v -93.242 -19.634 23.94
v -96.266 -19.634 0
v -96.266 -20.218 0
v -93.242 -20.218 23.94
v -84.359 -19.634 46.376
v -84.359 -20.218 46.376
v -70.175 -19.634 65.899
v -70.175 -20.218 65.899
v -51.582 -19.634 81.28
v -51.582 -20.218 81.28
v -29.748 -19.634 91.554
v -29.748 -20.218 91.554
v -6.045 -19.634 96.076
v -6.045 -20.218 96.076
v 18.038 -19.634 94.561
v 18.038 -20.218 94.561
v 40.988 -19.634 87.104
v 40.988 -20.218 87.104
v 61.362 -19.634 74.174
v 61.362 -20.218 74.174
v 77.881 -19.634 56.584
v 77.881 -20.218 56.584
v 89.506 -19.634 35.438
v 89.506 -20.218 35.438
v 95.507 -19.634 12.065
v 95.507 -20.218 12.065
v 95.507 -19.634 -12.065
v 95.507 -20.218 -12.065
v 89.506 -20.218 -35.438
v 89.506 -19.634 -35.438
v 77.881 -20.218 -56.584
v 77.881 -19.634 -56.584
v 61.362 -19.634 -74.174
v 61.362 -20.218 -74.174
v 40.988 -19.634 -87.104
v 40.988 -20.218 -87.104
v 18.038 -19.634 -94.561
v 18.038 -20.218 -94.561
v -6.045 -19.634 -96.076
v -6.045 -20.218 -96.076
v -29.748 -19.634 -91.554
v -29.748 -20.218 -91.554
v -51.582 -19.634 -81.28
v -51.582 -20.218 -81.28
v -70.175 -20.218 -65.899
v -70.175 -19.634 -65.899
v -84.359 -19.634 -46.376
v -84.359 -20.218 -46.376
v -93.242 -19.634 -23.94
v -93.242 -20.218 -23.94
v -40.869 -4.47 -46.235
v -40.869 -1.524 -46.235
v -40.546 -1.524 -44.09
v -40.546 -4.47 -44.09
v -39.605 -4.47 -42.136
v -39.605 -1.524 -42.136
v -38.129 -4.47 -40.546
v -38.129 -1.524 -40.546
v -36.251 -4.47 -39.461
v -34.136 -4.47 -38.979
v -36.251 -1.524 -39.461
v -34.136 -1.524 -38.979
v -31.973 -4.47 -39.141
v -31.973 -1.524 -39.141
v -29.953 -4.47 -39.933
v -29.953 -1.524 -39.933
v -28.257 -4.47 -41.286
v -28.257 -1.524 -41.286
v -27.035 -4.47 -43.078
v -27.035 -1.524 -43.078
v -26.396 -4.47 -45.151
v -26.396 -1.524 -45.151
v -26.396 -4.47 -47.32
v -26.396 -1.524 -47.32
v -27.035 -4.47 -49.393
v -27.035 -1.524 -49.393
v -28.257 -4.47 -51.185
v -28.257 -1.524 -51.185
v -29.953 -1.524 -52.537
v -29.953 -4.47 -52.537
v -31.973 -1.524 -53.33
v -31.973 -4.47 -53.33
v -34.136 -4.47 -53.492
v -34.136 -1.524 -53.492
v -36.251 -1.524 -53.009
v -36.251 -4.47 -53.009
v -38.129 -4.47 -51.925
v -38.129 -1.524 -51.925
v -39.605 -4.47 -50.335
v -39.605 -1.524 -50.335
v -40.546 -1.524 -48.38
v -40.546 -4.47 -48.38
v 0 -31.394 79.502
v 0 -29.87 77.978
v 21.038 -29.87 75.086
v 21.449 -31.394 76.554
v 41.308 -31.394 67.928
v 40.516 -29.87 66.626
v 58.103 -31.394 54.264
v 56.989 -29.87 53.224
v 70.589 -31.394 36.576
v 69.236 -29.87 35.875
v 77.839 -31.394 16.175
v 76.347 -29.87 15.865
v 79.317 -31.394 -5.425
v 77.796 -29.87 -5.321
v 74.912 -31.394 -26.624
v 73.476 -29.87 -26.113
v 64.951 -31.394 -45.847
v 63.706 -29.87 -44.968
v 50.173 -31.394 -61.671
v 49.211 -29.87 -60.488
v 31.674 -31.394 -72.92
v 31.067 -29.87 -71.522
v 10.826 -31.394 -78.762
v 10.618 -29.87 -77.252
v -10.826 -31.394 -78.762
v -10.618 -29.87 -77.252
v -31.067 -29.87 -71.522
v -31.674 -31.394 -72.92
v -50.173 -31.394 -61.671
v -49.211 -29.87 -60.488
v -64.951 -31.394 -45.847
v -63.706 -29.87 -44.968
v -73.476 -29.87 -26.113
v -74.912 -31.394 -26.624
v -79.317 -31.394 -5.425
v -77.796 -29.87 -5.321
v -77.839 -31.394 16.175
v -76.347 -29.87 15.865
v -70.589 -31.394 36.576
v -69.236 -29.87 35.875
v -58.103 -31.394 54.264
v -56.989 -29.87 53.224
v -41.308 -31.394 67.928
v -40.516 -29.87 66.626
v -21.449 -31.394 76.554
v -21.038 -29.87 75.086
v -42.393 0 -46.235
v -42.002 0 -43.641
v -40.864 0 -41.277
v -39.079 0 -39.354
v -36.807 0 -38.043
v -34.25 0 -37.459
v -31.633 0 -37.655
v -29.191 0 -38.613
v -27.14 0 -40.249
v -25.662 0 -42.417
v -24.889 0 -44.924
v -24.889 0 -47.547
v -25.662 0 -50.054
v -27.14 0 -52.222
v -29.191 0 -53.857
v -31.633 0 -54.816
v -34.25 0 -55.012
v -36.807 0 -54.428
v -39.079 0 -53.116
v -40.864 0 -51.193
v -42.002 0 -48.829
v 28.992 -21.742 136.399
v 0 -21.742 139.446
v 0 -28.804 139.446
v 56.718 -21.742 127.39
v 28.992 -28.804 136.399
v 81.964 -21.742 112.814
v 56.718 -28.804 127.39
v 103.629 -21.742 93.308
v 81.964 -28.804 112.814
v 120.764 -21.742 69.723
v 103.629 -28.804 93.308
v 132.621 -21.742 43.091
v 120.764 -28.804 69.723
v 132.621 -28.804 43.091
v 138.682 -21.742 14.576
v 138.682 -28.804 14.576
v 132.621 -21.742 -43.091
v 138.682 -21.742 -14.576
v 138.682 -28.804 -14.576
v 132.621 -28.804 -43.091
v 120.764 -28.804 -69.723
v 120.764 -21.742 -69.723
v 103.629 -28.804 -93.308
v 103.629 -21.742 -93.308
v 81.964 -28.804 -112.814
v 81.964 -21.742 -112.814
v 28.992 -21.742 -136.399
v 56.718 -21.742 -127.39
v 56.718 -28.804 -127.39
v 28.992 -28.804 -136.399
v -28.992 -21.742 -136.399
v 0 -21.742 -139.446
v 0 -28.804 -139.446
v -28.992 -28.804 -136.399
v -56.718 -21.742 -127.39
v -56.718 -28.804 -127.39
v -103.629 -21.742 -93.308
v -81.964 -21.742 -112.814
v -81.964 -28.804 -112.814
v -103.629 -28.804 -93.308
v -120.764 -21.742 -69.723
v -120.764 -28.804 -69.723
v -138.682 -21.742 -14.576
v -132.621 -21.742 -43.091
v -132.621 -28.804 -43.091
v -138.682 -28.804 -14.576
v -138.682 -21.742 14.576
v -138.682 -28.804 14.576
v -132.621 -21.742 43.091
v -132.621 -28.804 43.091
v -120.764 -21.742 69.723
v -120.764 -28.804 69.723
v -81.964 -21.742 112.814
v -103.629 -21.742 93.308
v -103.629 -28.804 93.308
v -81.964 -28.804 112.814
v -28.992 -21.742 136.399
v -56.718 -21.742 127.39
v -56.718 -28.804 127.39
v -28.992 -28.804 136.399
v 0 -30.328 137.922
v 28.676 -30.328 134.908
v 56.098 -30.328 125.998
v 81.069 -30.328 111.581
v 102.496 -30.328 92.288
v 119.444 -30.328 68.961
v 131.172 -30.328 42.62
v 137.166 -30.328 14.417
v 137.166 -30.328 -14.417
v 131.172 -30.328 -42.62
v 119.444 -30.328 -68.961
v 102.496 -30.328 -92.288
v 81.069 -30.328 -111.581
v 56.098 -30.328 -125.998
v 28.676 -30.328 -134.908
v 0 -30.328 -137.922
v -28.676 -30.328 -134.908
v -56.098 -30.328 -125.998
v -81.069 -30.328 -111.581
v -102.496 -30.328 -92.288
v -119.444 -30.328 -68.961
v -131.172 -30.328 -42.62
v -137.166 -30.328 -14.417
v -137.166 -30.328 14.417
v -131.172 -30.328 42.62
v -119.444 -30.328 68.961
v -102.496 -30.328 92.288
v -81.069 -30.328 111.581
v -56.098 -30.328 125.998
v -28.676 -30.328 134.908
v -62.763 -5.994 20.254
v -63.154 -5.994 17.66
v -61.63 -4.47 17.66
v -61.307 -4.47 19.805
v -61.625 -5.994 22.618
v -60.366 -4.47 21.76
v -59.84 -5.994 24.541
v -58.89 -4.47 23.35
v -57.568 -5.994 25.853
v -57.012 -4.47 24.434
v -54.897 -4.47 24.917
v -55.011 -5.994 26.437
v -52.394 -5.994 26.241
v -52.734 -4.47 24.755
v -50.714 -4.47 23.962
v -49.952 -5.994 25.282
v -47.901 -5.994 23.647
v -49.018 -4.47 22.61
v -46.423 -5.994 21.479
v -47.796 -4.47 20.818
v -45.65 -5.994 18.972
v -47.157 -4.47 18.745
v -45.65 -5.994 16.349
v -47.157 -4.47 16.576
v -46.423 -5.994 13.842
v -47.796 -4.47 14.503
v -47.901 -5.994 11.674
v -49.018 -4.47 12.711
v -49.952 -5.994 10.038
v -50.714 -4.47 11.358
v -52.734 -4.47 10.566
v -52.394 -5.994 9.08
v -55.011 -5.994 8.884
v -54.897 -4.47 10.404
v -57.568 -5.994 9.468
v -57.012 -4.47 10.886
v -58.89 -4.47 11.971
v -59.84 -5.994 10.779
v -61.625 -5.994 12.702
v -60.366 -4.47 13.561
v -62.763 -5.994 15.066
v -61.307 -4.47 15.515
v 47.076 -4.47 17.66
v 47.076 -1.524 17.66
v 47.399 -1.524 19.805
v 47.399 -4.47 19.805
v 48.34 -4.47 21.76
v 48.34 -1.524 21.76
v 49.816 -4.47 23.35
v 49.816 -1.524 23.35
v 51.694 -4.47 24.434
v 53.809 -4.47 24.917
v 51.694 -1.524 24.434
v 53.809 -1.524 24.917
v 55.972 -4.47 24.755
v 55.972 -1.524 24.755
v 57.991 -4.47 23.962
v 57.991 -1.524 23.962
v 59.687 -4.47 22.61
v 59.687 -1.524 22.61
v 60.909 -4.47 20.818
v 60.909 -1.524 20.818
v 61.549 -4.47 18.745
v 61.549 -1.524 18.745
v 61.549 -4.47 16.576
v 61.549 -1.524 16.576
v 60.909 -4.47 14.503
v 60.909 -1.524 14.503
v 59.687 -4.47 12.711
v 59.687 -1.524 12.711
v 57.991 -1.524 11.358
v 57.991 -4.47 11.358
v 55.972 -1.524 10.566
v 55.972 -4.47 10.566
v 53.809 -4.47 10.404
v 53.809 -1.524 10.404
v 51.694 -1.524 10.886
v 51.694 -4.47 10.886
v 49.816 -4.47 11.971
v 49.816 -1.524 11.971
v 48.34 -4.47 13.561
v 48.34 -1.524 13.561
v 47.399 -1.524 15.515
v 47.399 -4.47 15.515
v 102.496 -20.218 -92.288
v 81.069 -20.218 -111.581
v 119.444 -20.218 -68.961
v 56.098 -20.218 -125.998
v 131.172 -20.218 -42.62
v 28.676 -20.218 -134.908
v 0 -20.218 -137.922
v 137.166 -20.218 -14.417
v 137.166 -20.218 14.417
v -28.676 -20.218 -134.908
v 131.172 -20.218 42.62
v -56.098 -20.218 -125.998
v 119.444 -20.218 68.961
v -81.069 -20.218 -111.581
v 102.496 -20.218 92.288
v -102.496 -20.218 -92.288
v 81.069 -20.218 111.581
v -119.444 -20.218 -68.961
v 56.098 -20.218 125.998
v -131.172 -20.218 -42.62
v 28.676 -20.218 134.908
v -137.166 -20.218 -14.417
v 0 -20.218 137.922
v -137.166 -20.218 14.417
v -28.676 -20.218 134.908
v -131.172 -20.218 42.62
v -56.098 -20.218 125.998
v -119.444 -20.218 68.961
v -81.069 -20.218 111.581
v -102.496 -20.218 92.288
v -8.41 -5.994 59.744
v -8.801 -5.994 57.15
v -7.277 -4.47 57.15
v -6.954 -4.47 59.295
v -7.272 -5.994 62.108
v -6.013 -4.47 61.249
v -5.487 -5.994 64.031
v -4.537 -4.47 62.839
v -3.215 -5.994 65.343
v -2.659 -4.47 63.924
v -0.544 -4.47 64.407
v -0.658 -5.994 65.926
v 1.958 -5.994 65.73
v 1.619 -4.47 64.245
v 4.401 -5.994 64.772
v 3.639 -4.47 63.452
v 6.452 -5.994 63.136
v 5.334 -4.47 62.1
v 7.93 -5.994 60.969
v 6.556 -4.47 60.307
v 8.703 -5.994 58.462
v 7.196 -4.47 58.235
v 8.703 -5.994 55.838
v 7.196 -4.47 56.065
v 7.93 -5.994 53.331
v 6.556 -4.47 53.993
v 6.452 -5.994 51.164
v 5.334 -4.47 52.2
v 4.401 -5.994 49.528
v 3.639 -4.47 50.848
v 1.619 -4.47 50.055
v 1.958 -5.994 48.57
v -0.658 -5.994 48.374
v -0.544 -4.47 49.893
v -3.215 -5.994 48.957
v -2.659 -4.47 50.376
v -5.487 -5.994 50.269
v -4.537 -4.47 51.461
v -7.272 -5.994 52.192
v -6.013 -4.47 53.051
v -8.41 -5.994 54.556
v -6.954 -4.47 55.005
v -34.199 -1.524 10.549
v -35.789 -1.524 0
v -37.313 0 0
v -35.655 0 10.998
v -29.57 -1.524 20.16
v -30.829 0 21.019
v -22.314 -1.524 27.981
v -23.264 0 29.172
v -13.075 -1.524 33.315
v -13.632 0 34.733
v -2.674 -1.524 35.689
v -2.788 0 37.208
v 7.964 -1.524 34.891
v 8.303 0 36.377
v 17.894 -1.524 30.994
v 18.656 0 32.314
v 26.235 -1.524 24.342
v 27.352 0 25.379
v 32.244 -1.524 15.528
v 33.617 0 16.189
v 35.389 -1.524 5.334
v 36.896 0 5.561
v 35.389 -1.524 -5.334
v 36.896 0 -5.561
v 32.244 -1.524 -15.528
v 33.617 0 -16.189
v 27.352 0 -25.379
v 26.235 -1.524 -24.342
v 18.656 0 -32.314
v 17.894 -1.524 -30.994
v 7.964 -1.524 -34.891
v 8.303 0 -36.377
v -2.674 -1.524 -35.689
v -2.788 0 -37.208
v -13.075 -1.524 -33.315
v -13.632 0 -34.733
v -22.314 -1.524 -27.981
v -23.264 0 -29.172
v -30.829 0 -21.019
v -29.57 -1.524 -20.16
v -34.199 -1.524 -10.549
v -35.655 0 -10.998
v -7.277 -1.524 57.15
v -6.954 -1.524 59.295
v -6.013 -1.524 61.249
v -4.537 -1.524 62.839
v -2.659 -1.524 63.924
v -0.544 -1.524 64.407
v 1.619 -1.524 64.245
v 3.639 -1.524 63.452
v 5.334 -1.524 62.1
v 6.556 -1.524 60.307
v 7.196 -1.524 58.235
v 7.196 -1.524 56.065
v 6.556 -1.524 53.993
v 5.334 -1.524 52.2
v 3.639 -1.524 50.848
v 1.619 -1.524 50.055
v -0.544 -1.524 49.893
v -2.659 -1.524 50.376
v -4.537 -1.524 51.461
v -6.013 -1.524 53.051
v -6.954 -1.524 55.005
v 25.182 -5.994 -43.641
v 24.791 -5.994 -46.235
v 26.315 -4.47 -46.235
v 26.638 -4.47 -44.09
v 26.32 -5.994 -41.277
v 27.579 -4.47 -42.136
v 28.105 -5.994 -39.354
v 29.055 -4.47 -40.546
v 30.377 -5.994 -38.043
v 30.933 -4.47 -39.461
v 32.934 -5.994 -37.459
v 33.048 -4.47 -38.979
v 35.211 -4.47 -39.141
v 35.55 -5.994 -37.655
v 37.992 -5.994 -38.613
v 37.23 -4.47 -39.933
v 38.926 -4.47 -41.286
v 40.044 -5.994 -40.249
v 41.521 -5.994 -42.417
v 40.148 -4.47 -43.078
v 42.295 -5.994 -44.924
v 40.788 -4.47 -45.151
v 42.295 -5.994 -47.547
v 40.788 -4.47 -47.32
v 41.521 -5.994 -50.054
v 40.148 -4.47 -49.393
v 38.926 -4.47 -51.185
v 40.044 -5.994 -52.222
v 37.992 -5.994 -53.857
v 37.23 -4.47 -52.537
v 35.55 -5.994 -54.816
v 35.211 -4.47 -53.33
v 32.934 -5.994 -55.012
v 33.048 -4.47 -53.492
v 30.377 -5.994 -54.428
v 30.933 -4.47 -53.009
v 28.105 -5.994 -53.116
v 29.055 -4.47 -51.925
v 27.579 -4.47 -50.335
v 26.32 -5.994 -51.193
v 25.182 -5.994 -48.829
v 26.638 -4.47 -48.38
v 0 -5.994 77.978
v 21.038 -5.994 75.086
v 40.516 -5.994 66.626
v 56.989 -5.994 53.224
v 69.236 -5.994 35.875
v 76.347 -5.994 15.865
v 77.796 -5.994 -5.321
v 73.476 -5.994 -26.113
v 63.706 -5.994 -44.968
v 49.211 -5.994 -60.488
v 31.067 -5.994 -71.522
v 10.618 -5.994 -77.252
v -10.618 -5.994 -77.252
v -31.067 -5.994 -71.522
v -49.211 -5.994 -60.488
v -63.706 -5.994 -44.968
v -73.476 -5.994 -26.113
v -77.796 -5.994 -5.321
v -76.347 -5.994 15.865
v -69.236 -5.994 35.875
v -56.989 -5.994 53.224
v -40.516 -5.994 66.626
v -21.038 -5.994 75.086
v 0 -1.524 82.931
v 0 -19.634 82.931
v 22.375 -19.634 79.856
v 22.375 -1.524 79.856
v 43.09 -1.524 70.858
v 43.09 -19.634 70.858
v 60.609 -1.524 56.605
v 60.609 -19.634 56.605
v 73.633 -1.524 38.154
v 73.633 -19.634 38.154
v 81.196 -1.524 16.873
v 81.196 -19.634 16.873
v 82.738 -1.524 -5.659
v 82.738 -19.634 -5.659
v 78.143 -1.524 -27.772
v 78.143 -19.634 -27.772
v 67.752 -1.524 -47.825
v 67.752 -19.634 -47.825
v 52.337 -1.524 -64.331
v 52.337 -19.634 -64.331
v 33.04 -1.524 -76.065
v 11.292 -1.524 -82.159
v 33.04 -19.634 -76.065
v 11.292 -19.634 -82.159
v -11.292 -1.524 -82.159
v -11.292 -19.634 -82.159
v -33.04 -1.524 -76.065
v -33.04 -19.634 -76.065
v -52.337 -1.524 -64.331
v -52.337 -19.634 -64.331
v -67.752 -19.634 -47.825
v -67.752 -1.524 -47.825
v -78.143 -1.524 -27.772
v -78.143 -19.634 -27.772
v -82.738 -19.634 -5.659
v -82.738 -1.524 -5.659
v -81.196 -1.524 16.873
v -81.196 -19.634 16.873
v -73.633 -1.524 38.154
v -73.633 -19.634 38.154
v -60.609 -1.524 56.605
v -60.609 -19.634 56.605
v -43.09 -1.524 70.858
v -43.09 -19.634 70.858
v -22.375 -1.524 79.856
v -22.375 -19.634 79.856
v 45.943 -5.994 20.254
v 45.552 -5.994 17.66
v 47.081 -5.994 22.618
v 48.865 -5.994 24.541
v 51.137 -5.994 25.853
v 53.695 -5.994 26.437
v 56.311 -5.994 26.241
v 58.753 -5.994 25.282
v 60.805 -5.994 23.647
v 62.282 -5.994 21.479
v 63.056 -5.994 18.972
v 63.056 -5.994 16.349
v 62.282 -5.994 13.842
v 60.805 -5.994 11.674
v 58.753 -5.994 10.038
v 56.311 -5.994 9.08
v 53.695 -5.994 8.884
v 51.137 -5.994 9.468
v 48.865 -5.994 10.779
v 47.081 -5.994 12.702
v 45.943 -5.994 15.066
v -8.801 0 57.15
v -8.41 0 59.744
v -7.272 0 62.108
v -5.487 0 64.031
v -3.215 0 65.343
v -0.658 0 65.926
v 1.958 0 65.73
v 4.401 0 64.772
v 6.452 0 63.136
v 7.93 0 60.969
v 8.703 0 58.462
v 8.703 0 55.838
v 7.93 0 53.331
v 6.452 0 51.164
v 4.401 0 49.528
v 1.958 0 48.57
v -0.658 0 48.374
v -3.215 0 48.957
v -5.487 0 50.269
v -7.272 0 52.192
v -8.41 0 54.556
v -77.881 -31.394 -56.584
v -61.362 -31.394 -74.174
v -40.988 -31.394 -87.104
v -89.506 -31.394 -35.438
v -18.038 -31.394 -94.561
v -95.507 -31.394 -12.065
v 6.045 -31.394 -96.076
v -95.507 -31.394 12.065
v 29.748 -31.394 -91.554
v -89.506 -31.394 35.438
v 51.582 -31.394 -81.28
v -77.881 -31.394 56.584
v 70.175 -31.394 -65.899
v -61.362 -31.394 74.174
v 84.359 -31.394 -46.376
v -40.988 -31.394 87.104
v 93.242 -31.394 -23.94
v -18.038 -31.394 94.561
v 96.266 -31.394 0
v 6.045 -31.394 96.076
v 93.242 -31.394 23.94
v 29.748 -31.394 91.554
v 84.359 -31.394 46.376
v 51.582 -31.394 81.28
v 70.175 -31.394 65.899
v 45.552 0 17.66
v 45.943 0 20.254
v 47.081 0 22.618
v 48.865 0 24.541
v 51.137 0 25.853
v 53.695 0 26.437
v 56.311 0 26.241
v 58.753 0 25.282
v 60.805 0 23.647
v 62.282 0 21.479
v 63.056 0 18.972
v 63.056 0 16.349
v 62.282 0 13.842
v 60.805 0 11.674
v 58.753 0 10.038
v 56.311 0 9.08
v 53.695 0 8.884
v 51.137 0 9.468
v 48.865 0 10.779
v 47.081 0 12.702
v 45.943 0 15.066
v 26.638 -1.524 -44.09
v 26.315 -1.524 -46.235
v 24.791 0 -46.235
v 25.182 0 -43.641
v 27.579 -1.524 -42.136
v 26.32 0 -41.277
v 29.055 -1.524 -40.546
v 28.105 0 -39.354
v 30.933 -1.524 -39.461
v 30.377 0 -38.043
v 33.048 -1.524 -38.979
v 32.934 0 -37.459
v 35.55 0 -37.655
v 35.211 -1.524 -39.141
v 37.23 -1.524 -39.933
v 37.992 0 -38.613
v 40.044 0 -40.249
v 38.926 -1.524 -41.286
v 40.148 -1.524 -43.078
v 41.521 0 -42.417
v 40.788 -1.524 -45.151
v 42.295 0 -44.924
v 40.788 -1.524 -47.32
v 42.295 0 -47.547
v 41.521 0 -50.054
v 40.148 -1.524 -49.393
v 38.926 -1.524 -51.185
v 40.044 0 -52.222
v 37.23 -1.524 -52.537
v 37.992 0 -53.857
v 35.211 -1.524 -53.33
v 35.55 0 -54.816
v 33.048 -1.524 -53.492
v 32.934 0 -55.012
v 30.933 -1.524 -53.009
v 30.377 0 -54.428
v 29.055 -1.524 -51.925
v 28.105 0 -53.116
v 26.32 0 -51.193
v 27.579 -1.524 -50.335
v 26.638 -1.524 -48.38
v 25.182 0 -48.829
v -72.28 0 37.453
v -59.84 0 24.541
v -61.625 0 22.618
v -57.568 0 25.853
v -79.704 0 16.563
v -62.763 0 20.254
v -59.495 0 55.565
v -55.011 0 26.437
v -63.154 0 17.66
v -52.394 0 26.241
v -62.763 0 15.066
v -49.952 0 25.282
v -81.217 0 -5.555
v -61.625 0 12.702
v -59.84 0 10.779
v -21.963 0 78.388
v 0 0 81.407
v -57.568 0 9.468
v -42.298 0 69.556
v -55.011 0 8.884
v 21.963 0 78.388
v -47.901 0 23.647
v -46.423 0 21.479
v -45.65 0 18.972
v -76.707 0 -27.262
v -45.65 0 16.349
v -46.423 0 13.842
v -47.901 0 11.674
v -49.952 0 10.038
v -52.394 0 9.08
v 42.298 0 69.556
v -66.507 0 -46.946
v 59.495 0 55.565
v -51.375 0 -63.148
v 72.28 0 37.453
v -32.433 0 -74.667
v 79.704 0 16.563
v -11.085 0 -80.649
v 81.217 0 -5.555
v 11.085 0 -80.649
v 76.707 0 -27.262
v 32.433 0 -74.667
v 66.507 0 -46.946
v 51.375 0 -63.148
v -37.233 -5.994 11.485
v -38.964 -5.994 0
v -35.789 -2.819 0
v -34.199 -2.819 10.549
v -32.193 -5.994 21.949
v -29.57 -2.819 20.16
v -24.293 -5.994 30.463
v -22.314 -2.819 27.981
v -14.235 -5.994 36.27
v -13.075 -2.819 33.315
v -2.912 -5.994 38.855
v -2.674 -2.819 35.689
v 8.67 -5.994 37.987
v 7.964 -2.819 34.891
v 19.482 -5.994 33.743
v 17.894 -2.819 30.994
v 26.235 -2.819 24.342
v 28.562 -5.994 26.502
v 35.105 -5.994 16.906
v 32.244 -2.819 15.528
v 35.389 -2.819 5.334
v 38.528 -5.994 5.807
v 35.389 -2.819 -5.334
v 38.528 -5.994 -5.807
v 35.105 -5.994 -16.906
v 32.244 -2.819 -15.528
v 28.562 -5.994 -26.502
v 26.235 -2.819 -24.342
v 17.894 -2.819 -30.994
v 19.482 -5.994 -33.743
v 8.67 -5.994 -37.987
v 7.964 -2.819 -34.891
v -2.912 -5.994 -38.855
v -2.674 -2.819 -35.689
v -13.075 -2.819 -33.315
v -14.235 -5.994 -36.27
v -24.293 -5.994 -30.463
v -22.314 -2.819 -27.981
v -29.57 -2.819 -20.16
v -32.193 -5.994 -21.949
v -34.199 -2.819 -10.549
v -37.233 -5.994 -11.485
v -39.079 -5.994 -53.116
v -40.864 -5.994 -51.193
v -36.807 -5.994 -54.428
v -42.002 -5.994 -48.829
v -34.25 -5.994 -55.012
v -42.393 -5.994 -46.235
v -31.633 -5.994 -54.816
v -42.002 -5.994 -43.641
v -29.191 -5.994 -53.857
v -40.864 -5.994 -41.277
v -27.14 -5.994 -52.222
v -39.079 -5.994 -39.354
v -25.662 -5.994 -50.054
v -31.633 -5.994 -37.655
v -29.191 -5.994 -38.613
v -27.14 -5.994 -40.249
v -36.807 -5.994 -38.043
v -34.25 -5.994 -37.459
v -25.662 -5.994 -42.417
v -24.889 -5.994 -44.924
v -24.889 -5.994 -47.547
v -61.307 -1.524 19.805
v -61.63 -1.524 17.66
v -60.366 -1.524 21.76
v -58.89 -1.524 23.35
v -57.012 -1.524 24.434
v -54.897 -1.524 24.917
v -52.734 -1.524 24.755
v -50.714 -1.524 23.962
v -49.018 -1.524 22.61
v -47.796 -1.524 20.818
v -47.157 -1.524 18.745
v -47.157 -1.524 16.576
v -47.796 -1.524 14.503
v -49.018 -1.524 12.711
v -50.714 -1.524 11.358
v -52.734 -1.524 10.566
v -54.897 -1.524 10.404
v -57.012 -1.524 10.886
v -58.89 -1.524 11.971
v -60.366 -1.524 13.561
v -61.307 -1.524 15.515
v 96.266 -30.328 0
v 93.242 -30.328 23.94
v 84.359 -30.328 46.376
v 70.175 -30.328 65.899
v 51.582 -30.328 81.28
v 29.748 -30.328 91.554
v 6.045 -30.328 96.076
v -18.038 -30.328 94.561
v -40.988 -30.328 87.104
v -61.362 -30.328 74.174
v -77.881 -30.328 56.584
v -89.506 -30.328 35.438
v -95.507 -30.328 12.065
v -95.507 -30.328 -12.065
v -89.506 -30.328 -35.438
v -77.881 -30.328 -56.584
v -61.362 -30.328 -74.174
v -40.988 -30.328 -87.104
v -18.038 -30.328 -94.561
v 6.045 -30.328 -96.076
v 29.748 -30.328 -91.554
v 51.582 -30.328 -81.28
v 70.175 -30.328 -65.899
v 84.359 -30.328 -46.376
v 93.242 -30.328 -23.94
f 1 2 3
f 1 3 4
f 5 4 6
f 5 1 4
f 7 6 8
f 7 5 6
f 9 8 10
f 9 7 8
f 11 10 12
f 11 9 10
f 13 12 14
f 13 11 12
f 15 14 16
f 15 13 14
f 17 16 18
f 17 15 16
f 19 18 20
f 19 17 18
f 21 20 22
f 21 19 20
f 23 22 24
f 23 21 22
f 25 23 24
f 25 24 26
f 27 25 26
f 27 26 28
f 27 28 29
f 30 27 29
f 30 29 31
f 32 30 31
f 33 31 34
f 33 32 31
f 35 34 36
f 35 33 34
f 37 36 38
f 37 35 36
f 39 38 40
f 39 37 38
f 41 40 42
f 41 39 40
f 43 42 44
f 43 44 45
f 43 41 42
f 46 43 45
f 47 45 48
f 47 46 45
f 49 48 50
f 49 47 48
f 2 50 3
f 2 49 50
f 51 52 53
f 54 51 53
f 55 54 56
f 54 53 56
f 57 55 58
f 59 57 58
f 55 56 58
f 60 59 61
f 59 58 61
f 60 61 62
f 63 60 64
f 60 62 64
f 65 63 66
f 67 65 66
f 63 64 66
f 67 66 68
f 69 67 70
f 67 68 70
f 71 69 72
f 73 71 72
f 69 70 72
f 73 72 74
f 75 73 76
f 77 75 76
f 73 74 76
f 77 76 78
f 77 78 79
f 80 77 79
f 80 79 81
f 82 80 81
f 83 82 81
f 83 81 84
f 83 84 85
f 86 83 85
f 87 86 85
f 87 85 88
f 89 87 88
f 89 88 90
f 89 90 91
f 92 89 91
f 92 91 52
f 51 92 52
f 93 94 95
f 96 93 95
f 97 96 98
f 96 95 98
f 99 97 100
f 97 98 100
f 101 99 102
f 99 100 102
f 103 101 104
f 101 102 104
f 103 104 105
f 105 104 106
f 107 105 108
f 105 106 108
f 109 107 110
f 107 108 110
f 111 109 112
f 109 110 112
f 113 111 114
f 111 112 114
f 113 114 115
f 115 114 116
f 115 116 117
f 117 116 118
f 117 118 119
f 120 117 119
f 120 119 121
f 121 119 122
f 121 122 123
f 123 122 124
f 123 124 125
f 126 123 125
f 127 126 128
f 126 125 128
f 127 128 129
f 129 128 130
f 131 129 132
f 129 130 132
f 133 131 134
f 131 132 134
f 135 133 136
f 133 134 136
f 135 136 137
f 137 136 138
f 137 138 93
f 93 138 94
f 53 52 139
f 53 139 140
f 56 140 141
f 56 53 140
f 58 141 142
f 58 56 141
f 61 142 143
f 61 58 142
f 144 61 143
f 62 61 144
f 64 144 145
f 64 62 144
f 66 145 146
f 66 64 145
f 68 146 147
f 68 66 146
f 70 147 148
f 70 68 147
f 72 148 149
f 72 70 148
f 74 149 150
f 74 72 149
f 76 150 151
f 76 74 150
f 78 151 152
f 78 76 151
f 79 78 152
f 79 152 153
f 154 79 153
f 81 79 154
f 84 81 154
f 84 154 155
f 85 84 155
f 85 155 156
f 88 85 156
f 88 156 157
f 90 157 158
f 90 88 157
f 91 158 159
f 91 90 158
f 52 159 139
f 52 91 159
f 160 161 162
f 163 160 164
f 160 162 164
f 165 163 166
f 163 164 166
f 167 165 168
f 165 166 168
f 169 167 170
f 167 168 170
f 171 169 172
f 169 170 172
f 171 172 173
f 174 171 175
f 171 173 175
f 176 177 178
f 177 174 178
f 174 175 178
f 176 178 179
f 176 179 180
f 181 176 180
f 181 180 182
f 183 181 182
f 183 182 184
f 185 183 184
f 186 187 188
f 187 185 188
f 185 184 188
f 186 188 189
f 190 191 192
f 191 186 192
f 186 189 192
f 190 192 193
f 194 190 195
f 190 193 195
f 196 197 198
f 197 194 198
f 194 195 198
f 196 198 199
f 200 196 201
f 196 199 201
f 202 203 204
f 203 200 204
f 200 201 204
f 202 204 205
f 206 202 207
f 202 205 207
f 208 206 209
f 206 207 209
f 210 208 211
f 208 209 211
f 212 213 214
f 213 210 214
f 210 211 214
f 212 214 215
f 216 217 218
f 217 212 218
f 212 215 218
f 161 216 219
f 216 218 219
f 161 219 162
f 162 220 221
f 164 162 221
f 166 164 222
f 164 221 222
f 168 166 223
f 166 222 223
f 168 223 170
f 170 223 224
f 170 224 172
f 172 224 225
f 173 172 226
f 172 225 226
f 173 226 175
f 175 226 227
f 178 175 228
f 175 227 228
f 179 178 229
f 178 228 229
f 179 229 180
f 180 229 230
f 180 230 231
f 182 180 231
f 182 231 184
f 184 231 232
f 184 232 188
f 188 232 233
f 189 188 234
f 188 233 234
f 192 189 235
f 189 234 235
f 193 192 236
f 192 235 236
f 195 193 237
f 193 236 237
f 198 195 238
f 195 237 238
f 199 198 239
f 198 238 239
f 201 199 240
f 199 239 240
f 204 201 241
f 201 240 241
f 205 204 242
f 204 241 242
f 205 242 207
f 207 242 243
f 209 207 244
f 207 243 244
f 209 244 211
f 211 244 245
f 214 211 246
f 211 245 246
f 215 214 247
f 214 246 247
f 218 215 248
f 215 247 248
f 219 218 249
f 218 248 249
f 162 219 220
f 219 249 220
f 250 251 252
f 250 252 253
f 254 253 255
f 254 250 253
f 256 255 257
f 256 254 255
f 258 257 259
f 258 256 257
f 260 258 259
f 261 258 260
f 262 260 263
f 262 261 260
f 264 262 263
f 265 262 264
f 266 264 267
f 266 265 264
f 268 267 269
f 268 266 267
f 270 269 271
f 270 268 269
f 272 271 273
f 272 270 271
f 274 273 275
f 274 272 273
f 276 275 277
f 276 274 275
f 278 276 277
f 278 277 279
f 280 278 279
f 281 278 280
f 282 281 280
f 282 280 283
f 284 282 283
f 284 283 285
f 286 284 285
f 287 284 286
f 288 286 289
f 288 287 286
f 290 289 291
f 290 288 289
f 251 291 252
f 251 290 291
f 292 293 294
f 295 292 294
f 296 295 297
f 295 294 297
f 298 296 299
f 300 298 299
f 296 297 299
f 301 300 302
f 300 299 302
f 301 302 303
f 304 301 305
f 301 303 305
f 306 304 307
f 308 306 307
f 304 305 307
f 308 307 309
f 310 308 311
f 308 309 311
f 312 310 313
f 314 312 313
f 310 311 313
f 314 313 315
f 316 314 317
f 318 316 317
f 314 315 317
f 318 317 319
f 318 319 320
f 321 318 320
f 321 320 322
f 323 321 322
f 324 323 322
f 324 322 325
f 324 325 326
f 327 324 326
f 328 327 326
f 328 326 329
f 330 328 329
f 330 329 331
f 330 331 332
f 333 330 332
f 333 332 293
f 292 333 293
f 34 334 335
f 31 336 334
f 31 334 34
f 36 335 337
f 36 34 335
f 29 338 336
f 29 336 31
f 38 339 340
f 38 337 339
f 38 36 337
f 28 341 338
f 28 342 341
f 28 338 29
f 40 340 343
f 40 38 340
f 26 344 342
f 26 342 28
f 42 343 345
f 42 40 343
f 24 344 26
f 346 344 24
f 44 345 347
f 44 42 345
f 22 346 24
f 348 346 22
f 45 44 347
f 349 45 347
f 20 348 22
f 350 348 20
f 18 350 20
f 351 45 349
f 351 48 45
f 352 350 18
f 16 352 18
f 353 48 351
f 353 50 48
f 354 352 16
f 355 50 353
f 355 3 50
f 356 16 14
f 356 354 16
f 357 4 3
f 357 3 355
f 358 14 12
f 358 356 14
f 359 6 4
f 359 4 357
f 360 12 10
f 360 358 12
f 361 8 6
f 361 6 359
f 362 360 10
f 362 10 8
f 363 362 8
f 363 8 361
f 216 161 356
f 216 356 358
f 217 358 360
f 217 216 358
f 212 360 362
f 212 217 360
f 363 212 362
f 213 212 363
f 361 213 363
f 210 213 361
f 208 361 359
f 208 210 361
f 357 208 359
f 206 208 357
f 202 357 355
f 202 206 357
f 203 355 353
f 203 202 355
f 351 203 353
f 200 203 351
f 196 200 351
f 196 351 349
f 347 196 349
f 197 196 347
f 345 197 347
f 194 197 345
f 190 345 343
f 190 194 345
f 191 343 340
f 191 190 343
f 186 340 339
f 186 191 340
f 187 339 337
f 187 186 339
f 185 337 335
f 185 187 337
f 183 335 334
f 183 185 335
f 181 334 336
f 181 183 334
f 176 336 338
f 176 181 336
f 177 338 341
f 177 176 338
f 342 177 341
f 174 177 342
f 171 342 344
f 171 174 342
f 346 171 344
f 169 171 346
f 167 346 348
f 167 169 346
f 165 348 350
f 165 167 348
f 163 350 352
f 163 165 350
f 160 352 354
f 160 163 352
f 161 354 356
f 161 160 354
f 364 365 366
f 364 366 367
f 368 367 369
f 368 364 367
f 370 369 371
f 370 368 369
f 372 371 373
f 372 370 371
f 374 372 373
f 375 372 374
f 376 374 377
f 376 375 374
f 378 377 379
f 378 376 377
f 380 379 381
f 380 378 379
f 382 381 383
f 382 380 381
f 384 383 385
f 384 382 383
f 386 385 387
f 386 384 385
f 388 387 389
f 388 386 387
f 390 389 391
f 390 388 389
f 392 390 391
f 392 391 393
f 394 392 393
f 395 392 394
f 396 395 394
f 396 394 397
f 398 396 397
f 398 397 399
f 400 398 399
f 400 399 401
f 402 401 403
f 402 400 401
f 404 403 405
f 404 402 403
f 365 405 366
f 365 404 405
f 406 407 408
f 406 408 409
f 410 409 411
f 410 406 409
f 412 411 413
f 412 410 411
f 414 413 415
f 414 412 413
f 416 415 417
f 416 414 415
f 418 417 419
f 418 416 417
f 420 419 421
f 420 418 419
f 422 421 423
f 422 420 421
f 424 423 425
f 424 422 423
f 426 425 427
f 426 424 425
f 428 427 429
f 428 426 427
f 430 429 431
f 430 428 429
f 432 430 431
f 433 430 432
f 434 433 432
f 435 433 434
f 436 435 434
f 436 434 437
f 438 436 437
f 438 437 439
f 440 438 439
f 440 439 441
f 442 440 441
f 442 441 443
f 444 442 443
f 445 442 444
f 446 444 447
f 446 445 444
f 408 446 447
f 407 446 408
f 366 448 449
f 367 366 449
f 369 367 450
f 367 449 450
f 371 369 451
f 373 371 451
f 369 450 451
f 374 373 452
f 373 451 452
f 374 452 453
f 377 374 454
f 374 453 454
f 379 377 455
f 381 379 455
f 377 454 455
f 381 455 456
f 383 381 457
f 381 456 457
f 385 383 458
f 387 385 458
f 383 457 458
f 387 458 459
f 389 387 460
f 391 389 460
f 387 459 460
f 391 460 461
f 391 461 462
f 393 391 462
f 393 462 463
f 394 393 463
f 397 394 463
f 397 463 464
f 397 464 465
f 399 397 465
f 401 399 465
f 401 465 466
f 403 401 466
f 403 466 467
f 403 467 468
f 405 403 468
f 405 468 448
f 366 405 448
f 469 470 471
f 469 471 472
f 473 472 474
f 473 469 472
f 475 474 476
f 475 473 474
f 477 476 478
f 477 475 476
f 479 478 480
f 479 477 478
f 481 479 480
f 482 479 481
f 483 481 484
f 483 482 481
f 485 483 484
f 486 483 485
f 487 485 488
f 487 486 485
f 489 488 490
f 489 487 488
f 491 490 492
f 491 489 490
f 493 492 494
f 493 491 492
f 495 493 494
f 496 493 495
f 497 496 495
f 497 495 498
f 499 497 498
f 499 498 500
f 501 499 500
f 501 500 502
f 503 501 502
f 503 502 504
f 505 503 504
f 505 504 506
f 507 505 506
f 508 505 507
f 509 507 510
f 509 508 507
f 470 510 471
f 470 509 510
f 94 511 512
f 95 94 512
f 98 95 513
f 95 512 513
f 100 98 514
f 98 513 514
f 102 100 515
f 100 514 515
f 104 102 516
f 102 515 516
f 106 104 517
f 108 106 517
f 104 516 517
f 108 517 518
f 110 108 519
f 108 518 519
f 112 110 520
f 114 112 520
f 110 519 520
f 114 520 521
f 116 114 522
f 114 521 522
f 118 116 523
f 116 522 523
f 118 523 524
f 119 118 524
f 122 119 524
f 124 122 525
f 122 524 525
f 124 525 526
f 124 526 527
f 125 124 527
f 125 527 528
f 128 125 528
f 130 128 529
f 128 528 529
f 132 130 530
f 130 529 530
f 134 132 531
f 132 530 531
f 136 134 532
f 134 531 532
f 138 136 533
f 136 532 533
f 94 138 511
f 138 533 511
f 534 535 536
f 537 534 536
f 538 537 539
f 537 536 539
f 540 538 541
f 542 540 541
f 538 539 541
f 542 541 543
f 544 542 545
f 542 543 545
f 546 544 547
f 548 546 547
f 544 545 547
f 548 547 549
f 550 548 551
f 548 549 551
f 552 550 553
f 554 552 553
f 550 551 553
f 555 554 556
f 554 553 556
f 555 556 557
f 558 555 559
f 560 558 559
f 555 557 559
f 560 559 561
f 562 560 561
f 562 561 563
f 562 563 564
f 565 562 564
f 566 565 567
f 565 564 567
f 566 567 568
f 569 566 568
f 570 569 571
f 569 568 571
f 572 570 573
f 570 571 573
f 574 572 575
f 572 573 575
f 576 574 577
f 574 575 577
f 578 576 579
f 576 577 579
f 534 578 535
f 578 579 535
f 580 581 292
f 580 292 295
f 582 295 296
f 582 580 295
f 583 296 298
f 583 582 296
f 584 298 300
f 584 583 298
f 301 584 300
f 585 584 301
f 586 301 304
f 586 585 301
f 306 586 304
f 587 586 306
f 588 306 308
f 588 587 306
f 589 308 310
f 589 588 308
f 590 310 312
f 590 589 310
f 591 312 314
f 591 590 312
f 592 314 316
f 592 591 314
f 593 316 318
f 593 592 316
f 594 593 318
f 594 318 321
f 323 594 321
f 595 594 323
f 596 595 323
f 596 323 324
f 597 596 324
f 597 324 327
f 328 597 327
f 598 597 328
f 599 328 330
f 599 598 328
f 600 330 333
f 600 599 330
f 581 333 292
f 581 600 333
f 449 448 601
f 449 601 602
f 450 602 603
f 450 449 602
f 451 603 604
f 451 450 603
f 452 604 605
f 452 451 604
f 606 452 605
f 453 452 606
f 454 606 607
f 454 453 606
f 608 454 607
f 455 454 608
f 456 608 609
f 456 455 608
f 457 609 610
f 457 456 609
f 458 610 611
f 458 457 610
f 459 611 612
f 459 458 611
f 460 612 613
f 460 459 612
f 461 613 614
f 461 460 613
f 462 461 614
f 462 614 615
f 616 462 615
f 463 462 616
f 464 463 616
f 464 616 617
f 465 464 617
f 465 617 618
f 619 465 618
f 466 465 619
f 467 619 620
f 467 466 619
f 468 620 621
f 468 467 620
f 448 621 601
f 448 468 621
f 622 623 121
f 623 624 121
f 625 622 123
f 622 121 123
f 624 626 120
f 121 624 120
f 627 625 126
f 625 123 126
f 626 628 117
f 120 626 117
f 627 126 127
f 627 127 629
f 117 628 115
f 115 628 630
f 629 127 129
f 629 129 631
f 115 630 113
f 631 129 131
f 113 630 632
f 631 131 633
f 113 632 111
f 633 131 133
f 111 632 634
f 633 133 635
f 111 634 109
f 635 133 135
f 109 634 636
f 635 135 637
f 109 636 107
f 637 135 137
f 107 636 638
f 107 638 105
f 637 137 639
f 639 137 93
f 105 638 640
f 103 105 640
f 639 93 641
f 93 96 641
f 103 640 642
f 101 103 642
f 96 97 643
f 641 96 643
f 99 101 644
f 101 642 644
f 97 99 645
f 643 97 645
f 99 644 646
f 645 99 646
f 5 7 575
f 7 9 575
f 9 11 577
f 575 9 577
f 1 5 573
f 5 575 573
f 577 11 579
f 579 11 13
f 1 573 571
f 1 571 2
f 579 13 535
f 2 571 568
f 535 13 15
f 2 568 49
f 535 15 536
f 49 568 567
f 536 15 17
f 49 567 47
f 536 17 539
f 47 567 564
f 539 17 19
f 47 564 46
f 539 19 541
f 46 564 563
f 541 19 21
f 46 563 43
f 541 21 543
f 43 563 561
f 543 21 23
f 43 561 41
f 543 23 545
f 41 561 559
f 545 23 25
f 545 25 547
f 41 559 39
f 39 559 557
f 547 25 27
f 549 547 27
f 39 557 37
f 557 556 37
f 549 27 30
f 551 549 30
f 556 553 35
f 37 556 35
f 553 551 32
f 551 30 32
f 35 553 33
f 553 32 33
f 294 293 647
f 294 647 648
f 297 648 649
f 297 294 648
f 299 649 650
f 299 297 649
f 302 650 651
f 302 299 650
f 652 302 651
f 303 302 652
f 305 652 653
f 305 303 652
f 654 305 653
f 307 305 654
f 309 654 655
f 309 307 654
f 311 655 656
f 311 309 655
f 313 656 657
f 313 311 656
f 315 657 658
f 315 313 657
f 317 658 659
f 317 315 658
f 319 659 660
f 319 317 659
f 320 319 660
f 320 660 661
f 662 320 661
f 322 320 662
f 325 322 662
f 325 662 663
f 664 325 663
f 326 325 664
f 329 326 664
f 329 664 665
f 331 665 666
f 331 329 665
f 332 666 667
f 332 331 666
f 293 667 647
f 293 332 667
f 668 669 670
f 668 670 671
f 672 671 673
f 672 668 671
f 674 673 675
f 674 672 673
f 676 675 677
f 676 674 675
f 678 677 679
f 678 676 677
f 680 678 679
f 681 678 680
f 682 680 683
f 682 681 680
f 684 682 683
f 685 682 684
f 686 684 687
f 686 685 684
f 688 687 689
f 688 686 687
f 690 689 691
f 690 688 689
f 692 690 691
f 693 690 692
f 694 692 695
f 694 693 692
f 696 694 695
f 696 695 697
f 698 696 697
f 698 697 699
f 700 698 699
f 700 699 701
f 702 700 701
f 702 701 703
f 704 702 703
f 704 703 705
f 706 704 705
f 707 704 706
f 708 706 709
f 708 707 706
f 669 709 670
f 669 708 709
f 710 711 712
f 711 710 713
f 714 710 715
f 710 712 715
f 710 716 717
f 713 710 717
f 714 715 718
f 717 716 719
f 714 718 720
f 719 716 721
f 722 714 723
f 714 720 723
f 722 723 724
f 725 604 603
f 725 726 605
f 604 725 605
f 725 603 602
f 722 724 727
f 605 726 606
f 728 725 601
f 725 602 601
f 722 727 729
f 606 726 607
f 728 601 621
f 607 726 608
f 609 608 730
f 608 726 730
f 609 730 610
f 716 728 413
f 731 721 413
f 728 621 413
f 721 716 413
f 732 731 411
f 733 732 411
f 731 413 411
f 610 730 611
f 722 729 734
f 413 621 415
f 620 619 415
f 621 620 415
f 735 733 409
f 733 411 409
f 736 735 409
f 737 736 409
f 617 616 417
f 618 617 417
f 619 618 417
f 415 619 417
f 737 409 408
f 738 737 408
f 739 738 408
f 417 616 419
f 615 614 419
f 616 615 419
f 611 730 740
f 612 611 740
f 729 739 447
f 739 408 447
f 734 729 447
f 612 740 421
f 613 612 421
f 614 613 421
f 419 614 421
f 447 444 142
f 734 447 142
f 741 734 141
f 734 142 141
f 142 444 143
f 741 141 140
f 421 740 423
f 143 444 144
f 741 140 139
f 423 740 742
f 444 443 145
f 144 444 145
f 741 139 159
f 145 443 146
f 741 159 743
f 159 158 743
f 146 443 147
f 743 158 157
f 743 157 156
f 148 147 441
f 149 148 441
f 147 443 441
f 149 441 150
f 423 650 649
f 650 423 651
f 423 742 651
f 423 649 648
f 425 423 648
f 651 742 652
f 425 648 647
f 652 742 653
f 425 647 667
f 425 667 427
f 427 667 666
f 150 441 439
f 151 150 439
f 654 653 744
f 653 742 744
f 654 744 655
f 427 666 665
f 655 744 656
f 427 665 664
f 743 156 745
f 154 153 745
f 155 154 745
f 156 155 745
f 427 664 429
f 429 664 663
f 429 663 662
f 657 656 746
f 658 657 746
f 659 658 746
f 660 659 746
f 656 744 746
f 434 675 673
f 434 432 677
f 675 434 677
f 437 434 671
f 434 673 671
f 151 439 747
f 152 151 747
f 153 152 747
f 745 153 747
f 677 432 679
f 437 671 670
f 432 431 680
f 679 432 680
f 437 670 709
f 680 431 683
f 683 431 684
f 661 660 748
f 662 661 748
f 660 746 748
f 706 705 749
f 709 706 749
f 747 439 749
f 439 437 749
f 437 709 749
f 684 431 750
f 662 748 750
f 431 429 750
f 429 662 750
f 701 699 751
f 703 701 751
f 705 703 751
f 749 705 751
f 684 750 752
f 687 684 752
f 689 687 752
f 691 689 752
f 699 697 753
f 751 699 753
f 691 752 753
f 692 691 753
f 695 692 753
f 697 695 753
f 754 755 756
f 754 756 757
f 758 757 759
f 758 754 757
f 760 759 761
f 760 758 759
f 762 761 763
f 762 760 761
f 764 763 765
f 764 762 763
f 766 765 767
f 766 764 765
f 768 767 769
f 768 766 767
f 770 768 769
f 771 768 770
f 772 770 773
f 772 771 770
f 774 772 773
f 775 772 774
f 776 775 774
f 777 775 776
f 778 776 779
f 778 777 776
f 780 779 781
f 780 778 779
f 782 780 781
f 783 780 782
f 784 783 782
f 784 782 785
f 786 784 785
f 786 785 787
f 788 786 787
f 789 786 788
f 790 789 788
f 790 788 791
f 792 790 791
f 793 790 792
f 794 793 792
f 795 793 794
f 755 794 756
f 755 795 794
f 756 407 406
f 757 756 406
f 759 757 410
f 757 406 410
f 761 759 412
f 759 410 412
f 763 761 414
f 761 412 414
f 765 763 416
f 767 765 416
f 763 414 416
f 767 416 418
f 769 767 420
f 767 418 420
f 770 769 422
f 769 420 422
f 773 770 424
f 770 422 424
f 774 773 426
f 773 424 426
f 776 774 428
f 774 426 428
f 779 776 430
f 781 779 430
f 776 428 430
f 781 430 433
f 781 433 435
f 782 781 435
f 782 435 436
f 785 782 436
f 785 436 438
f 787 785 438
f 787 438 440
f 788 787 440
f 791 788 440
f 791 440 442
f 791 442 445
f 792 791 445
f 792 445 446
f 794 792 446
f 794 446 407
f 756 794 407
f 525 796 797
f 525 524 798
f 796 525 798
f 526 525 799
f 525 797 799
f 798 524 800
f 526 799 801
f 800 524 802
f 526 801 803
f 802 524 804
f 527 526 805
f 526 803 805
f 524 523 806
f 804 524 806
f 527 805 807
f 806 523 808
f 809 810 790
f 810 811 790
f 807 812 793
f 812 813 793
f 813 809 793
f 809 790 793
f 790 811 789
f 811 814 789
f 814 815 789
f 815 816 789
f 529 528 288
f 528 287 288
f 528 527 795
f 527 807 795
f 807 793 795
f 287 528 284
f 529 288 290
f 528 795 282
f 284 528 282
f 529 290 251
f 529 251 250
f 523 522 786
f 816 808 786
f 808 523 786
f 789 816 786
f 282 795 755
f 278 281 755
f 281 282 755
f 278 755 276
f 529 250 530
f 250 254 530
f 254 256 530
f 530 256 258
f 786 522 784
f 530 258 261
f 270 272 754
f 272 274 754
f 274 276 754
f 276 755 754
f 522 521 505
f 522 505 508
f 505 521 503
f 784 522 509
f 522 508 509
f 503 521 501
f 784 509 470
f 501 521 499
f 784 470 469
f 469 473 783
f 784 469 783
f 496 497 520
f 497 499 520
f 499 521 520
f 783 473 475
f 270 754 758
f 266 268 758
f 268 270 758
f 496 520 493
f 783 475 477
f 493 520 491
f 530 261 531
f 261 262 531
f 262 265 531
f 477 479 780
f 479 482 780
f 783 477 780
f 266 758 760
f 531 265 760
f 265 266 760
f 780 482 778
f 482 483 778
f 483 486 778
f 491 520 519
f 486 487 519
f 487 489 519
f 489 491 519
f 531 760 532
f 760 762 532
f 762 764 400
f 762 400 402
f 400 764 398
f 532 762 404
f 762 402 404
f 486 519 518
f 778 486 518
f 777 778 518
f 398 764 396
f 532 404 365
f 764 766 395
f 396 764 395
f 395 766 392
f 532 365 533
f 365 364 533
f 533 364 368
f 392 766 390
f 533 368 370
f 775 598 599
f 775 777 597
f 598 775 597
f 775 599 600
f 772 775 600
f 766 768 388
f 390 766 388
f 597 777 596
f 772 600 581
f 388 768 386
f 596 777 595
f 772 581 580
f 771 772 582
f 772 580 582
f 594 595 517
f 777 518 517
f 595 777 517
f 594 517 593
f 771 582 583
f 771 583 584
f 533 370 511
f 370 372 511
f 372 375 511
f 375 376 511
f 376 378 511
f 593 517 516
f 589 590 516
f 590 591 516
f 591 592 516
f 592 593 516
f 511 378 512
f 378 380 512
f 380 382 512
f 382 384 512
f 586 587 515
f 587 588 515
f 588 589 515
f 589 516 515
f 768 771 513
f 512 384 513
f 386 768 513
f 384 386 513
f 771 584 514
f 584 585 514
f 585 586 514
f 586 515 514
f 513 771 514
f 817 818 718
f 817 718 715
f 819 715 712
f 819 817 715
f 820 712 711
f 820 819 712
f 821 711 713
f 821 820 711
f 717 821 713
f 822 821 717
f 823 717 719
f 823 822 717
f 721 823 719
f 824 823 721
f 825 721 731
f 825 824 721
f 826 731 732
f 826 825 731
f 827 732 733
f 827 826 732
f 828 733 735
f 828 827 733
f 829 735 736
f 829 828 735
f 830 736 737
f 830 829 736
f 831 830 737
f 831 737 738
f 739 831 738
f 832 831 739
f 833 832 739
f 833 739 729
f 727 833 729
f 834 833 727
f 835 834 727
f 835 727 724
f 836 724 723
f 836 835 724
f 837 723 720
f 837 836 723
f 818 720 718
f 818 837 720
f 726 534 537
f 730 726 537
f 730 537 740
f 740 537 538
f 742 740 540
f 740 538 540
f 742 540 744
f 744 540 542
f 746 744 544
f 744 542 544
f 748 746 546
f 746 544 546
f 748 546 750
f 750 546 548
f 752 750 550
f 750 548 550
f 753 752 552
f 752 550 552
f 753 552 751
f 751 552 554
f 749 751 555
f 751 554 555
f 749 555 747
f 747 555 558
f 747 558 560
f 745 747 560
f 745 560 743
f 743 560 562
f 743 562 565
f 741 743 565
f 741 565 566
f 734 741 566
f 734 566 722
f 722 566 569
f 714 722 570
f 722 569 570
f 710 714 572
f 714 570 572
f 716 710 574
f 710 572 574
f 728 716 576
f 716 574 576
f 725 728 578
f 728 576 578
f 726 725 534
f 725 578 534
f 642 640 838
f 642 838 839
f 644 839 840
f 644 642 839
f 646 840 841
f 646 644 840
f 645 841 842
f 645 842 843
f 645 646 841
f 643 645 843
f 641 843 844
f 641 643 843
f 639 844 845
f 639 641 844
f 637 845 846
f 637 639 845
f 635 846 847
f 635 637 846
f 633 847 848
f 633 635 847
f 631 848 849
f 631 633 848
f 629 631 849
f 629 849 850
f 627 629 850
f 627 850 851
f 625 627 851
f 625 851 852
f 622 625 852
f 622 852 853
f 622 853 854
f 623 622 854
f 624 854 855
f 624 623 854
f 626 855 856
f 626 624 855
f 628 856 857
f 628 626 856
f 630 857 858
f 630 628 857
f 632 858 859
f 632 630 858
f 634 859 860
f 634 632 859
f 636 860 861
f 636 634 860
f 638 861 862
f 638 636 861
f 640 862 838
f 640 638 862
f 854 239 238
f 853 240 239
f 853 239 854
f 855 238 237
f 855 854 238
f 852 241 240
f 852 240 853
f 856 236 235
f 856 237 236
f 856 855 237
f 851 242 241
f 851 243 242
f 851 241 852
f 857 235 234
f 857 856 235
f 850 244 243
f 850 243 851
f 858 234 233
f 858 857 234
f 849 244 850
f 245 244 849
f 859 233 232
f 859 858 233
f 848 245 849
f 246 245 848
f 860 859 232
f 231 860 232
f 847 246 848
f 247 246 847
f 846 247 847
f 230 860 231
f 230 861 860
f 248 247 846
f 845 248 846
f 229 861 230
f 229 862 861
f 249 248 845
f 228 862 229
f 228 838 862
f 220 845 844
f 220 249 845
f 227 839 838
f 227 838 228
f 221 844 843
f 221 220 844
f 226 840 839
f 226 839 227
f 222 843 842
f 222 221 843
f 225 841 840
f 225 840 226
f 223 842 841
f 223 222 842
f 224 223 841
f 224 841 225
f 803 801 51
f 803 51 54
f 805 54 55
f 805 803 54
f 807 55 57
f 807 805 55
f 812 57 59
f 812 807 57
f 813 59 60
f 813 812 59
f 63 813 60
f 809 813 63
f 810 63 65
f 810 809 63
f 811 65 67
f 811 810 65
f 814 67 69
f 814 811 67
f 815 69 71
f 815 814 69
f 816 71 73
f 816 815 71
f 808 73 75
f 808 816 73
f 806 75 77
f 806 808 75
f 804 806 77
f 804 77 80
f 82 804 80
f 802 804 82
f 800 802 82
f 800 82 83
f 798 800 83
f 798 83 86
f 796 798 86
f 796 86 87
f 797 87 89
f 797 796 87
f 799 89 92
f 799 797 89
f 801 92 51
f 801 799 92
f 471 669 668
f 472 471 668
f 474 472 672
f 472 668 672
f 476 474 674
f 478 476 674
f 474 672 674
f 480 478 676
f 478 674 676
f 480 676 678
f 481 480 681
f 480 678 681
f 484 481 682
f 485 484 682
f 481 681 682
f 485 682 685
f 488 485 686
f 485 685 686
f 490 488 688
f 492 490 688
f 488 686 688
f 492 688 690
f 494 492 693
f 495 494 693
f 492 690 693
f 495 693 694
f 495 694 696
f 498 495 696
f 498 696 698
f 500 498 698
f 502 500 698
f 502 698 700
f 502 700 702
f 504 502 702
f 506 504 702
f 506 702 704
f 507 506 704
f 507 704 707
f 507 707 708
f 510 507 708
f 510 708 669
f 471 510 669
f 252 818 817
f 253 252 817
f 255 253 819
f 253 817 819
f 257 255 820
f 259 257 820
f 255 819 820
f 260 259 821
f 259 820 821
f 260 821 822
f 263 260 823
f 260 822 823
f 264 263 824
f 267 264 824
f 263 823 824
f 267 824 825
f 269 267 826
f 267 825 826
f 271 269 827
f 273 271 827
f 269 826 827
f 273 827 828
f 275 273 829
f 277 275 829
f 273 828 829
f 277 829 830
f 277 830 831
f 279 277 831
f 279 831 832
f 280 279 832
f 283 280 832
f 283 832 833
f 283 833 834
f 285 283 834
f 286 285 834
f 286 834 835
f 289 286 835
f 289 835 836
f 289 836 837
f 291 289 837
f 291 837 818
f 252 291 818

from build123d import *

# Parameters (mm, degrees)
F2_R     = 169.8017669699
F2_R_2   = 96.266
F3_DEPTH = 0.5842
F4_R     = 139.446
F4_R_2   = 96.266
F5_DEPTH = 1.0668
F6_SIZE  = 1.524
F7_R     = 35.7886
F7_R_2   = 7.2771
F8_DEPTH = 25.4
F9_SIZE  = 1.524
F10_SIZE = 3.175


with BuildPart() as f1:
    # F0 (on Right) → F1 (revolve)
    with BuildSketch(Plane.YZ):
        Polygon((-5.9944, 0), (0, 0), (0, 82.931), (-19.6342, 82.931), (-19.6342, 139.446), (-31.3944, 139.446), (-31.3944, 77.978), (-5.9944, 77.978), align=None)
    revolve(axis=Axis((0, 54.5056797507, 0), (0, 1, 0)))

    # F2 (on face) → F3 (cut)
    with BuildSketch(Plane(origin=(0, -19.6342, 0), x_dir=(-1, 0, 0), z_dir=(0, 1, 0))):
        Circle(F2_R)
        Circle(F2_R_2, mode=Mode.SUBTRACT)
    extrude(amount=-F3_DEPTH, mode=Mode.SUBTRACT)

    # F4 (on face) → F5 (cut)
    with BuildSketch(Plane.XZ.offset(31.3944)):
        Circle(F4_R)
        Circle(F4_R_2, mode=Mode.SUBTRACT)
    extrude(amount=-F5_DEPTH, mode=Mode.SUBTRACT)

    # F6
    f6_edges = [f1.edges().sort_by_distance(p)[0] for p in [
        (0, -20.2184, -139.446),
        (0, -30.3276, -139.446),
        (0, 0, -82.931),
        (0, -31.3944, -77.978),
    ]]
    chamfer(f6_edges, length=F6_SIZE)

    # F7 (on face) → F8 (cut)
    with BuildSketch(Plane(origin=(0, 0, 0), x_dir=(-1, 0, 0), z_dir=(0, 1, 0))):
        Circle(F7_R)
        with Locations((0, 57.15)):
            Circle(F7_R_2)
        with Locations((-54.3528799063, 17.6603212285)):
            Circle(F7_R_2)
        with Locations((-33.5919271685, -46.2353212285)):
            Circle(F7_R_2)
        with Locations((33.5919271685, -46.2353212285)):
            Circle(F7_R_2)
        with Locations((54.3528799063, 17.6603212285)):
            Circle(F7_R_2)
    extrude(amount=-F8_DEPTH, mode=Mode.SUBTRACT)

    # F9
    f9_edges = [f1.edges().sort_by_distance(p)[0] for p in [
        (7.2771, 0, 57.15),
        (-47.07578, 0, 17.660321),
        (-26.314827, 0, -46.235321),
        (40.869027, 0, -46.235321),
        (61.62998, 0, 17.660321),
        (-26.314827, -5.9944, -46.235321),
        (-47.07578, -5.9944, 17.660321),
        (7.2771, -5.9944, 57.15),
        (61.62998, -5.9944, 17.660321),
        (40.869027, -5.9944, -46.235321),
        (35.7886, 0, 0),
    ]]
    chamfer(f9_edges, length=F9_SIZE)

    # F10
    f10_edges = [f1.edges().sort_by_distance(p)[0] for p in [
        (35.7886, -5.9944, 0),
    ]]
    chamfer(f10_edges, length=F10_SIZE)


solid = f1.part
